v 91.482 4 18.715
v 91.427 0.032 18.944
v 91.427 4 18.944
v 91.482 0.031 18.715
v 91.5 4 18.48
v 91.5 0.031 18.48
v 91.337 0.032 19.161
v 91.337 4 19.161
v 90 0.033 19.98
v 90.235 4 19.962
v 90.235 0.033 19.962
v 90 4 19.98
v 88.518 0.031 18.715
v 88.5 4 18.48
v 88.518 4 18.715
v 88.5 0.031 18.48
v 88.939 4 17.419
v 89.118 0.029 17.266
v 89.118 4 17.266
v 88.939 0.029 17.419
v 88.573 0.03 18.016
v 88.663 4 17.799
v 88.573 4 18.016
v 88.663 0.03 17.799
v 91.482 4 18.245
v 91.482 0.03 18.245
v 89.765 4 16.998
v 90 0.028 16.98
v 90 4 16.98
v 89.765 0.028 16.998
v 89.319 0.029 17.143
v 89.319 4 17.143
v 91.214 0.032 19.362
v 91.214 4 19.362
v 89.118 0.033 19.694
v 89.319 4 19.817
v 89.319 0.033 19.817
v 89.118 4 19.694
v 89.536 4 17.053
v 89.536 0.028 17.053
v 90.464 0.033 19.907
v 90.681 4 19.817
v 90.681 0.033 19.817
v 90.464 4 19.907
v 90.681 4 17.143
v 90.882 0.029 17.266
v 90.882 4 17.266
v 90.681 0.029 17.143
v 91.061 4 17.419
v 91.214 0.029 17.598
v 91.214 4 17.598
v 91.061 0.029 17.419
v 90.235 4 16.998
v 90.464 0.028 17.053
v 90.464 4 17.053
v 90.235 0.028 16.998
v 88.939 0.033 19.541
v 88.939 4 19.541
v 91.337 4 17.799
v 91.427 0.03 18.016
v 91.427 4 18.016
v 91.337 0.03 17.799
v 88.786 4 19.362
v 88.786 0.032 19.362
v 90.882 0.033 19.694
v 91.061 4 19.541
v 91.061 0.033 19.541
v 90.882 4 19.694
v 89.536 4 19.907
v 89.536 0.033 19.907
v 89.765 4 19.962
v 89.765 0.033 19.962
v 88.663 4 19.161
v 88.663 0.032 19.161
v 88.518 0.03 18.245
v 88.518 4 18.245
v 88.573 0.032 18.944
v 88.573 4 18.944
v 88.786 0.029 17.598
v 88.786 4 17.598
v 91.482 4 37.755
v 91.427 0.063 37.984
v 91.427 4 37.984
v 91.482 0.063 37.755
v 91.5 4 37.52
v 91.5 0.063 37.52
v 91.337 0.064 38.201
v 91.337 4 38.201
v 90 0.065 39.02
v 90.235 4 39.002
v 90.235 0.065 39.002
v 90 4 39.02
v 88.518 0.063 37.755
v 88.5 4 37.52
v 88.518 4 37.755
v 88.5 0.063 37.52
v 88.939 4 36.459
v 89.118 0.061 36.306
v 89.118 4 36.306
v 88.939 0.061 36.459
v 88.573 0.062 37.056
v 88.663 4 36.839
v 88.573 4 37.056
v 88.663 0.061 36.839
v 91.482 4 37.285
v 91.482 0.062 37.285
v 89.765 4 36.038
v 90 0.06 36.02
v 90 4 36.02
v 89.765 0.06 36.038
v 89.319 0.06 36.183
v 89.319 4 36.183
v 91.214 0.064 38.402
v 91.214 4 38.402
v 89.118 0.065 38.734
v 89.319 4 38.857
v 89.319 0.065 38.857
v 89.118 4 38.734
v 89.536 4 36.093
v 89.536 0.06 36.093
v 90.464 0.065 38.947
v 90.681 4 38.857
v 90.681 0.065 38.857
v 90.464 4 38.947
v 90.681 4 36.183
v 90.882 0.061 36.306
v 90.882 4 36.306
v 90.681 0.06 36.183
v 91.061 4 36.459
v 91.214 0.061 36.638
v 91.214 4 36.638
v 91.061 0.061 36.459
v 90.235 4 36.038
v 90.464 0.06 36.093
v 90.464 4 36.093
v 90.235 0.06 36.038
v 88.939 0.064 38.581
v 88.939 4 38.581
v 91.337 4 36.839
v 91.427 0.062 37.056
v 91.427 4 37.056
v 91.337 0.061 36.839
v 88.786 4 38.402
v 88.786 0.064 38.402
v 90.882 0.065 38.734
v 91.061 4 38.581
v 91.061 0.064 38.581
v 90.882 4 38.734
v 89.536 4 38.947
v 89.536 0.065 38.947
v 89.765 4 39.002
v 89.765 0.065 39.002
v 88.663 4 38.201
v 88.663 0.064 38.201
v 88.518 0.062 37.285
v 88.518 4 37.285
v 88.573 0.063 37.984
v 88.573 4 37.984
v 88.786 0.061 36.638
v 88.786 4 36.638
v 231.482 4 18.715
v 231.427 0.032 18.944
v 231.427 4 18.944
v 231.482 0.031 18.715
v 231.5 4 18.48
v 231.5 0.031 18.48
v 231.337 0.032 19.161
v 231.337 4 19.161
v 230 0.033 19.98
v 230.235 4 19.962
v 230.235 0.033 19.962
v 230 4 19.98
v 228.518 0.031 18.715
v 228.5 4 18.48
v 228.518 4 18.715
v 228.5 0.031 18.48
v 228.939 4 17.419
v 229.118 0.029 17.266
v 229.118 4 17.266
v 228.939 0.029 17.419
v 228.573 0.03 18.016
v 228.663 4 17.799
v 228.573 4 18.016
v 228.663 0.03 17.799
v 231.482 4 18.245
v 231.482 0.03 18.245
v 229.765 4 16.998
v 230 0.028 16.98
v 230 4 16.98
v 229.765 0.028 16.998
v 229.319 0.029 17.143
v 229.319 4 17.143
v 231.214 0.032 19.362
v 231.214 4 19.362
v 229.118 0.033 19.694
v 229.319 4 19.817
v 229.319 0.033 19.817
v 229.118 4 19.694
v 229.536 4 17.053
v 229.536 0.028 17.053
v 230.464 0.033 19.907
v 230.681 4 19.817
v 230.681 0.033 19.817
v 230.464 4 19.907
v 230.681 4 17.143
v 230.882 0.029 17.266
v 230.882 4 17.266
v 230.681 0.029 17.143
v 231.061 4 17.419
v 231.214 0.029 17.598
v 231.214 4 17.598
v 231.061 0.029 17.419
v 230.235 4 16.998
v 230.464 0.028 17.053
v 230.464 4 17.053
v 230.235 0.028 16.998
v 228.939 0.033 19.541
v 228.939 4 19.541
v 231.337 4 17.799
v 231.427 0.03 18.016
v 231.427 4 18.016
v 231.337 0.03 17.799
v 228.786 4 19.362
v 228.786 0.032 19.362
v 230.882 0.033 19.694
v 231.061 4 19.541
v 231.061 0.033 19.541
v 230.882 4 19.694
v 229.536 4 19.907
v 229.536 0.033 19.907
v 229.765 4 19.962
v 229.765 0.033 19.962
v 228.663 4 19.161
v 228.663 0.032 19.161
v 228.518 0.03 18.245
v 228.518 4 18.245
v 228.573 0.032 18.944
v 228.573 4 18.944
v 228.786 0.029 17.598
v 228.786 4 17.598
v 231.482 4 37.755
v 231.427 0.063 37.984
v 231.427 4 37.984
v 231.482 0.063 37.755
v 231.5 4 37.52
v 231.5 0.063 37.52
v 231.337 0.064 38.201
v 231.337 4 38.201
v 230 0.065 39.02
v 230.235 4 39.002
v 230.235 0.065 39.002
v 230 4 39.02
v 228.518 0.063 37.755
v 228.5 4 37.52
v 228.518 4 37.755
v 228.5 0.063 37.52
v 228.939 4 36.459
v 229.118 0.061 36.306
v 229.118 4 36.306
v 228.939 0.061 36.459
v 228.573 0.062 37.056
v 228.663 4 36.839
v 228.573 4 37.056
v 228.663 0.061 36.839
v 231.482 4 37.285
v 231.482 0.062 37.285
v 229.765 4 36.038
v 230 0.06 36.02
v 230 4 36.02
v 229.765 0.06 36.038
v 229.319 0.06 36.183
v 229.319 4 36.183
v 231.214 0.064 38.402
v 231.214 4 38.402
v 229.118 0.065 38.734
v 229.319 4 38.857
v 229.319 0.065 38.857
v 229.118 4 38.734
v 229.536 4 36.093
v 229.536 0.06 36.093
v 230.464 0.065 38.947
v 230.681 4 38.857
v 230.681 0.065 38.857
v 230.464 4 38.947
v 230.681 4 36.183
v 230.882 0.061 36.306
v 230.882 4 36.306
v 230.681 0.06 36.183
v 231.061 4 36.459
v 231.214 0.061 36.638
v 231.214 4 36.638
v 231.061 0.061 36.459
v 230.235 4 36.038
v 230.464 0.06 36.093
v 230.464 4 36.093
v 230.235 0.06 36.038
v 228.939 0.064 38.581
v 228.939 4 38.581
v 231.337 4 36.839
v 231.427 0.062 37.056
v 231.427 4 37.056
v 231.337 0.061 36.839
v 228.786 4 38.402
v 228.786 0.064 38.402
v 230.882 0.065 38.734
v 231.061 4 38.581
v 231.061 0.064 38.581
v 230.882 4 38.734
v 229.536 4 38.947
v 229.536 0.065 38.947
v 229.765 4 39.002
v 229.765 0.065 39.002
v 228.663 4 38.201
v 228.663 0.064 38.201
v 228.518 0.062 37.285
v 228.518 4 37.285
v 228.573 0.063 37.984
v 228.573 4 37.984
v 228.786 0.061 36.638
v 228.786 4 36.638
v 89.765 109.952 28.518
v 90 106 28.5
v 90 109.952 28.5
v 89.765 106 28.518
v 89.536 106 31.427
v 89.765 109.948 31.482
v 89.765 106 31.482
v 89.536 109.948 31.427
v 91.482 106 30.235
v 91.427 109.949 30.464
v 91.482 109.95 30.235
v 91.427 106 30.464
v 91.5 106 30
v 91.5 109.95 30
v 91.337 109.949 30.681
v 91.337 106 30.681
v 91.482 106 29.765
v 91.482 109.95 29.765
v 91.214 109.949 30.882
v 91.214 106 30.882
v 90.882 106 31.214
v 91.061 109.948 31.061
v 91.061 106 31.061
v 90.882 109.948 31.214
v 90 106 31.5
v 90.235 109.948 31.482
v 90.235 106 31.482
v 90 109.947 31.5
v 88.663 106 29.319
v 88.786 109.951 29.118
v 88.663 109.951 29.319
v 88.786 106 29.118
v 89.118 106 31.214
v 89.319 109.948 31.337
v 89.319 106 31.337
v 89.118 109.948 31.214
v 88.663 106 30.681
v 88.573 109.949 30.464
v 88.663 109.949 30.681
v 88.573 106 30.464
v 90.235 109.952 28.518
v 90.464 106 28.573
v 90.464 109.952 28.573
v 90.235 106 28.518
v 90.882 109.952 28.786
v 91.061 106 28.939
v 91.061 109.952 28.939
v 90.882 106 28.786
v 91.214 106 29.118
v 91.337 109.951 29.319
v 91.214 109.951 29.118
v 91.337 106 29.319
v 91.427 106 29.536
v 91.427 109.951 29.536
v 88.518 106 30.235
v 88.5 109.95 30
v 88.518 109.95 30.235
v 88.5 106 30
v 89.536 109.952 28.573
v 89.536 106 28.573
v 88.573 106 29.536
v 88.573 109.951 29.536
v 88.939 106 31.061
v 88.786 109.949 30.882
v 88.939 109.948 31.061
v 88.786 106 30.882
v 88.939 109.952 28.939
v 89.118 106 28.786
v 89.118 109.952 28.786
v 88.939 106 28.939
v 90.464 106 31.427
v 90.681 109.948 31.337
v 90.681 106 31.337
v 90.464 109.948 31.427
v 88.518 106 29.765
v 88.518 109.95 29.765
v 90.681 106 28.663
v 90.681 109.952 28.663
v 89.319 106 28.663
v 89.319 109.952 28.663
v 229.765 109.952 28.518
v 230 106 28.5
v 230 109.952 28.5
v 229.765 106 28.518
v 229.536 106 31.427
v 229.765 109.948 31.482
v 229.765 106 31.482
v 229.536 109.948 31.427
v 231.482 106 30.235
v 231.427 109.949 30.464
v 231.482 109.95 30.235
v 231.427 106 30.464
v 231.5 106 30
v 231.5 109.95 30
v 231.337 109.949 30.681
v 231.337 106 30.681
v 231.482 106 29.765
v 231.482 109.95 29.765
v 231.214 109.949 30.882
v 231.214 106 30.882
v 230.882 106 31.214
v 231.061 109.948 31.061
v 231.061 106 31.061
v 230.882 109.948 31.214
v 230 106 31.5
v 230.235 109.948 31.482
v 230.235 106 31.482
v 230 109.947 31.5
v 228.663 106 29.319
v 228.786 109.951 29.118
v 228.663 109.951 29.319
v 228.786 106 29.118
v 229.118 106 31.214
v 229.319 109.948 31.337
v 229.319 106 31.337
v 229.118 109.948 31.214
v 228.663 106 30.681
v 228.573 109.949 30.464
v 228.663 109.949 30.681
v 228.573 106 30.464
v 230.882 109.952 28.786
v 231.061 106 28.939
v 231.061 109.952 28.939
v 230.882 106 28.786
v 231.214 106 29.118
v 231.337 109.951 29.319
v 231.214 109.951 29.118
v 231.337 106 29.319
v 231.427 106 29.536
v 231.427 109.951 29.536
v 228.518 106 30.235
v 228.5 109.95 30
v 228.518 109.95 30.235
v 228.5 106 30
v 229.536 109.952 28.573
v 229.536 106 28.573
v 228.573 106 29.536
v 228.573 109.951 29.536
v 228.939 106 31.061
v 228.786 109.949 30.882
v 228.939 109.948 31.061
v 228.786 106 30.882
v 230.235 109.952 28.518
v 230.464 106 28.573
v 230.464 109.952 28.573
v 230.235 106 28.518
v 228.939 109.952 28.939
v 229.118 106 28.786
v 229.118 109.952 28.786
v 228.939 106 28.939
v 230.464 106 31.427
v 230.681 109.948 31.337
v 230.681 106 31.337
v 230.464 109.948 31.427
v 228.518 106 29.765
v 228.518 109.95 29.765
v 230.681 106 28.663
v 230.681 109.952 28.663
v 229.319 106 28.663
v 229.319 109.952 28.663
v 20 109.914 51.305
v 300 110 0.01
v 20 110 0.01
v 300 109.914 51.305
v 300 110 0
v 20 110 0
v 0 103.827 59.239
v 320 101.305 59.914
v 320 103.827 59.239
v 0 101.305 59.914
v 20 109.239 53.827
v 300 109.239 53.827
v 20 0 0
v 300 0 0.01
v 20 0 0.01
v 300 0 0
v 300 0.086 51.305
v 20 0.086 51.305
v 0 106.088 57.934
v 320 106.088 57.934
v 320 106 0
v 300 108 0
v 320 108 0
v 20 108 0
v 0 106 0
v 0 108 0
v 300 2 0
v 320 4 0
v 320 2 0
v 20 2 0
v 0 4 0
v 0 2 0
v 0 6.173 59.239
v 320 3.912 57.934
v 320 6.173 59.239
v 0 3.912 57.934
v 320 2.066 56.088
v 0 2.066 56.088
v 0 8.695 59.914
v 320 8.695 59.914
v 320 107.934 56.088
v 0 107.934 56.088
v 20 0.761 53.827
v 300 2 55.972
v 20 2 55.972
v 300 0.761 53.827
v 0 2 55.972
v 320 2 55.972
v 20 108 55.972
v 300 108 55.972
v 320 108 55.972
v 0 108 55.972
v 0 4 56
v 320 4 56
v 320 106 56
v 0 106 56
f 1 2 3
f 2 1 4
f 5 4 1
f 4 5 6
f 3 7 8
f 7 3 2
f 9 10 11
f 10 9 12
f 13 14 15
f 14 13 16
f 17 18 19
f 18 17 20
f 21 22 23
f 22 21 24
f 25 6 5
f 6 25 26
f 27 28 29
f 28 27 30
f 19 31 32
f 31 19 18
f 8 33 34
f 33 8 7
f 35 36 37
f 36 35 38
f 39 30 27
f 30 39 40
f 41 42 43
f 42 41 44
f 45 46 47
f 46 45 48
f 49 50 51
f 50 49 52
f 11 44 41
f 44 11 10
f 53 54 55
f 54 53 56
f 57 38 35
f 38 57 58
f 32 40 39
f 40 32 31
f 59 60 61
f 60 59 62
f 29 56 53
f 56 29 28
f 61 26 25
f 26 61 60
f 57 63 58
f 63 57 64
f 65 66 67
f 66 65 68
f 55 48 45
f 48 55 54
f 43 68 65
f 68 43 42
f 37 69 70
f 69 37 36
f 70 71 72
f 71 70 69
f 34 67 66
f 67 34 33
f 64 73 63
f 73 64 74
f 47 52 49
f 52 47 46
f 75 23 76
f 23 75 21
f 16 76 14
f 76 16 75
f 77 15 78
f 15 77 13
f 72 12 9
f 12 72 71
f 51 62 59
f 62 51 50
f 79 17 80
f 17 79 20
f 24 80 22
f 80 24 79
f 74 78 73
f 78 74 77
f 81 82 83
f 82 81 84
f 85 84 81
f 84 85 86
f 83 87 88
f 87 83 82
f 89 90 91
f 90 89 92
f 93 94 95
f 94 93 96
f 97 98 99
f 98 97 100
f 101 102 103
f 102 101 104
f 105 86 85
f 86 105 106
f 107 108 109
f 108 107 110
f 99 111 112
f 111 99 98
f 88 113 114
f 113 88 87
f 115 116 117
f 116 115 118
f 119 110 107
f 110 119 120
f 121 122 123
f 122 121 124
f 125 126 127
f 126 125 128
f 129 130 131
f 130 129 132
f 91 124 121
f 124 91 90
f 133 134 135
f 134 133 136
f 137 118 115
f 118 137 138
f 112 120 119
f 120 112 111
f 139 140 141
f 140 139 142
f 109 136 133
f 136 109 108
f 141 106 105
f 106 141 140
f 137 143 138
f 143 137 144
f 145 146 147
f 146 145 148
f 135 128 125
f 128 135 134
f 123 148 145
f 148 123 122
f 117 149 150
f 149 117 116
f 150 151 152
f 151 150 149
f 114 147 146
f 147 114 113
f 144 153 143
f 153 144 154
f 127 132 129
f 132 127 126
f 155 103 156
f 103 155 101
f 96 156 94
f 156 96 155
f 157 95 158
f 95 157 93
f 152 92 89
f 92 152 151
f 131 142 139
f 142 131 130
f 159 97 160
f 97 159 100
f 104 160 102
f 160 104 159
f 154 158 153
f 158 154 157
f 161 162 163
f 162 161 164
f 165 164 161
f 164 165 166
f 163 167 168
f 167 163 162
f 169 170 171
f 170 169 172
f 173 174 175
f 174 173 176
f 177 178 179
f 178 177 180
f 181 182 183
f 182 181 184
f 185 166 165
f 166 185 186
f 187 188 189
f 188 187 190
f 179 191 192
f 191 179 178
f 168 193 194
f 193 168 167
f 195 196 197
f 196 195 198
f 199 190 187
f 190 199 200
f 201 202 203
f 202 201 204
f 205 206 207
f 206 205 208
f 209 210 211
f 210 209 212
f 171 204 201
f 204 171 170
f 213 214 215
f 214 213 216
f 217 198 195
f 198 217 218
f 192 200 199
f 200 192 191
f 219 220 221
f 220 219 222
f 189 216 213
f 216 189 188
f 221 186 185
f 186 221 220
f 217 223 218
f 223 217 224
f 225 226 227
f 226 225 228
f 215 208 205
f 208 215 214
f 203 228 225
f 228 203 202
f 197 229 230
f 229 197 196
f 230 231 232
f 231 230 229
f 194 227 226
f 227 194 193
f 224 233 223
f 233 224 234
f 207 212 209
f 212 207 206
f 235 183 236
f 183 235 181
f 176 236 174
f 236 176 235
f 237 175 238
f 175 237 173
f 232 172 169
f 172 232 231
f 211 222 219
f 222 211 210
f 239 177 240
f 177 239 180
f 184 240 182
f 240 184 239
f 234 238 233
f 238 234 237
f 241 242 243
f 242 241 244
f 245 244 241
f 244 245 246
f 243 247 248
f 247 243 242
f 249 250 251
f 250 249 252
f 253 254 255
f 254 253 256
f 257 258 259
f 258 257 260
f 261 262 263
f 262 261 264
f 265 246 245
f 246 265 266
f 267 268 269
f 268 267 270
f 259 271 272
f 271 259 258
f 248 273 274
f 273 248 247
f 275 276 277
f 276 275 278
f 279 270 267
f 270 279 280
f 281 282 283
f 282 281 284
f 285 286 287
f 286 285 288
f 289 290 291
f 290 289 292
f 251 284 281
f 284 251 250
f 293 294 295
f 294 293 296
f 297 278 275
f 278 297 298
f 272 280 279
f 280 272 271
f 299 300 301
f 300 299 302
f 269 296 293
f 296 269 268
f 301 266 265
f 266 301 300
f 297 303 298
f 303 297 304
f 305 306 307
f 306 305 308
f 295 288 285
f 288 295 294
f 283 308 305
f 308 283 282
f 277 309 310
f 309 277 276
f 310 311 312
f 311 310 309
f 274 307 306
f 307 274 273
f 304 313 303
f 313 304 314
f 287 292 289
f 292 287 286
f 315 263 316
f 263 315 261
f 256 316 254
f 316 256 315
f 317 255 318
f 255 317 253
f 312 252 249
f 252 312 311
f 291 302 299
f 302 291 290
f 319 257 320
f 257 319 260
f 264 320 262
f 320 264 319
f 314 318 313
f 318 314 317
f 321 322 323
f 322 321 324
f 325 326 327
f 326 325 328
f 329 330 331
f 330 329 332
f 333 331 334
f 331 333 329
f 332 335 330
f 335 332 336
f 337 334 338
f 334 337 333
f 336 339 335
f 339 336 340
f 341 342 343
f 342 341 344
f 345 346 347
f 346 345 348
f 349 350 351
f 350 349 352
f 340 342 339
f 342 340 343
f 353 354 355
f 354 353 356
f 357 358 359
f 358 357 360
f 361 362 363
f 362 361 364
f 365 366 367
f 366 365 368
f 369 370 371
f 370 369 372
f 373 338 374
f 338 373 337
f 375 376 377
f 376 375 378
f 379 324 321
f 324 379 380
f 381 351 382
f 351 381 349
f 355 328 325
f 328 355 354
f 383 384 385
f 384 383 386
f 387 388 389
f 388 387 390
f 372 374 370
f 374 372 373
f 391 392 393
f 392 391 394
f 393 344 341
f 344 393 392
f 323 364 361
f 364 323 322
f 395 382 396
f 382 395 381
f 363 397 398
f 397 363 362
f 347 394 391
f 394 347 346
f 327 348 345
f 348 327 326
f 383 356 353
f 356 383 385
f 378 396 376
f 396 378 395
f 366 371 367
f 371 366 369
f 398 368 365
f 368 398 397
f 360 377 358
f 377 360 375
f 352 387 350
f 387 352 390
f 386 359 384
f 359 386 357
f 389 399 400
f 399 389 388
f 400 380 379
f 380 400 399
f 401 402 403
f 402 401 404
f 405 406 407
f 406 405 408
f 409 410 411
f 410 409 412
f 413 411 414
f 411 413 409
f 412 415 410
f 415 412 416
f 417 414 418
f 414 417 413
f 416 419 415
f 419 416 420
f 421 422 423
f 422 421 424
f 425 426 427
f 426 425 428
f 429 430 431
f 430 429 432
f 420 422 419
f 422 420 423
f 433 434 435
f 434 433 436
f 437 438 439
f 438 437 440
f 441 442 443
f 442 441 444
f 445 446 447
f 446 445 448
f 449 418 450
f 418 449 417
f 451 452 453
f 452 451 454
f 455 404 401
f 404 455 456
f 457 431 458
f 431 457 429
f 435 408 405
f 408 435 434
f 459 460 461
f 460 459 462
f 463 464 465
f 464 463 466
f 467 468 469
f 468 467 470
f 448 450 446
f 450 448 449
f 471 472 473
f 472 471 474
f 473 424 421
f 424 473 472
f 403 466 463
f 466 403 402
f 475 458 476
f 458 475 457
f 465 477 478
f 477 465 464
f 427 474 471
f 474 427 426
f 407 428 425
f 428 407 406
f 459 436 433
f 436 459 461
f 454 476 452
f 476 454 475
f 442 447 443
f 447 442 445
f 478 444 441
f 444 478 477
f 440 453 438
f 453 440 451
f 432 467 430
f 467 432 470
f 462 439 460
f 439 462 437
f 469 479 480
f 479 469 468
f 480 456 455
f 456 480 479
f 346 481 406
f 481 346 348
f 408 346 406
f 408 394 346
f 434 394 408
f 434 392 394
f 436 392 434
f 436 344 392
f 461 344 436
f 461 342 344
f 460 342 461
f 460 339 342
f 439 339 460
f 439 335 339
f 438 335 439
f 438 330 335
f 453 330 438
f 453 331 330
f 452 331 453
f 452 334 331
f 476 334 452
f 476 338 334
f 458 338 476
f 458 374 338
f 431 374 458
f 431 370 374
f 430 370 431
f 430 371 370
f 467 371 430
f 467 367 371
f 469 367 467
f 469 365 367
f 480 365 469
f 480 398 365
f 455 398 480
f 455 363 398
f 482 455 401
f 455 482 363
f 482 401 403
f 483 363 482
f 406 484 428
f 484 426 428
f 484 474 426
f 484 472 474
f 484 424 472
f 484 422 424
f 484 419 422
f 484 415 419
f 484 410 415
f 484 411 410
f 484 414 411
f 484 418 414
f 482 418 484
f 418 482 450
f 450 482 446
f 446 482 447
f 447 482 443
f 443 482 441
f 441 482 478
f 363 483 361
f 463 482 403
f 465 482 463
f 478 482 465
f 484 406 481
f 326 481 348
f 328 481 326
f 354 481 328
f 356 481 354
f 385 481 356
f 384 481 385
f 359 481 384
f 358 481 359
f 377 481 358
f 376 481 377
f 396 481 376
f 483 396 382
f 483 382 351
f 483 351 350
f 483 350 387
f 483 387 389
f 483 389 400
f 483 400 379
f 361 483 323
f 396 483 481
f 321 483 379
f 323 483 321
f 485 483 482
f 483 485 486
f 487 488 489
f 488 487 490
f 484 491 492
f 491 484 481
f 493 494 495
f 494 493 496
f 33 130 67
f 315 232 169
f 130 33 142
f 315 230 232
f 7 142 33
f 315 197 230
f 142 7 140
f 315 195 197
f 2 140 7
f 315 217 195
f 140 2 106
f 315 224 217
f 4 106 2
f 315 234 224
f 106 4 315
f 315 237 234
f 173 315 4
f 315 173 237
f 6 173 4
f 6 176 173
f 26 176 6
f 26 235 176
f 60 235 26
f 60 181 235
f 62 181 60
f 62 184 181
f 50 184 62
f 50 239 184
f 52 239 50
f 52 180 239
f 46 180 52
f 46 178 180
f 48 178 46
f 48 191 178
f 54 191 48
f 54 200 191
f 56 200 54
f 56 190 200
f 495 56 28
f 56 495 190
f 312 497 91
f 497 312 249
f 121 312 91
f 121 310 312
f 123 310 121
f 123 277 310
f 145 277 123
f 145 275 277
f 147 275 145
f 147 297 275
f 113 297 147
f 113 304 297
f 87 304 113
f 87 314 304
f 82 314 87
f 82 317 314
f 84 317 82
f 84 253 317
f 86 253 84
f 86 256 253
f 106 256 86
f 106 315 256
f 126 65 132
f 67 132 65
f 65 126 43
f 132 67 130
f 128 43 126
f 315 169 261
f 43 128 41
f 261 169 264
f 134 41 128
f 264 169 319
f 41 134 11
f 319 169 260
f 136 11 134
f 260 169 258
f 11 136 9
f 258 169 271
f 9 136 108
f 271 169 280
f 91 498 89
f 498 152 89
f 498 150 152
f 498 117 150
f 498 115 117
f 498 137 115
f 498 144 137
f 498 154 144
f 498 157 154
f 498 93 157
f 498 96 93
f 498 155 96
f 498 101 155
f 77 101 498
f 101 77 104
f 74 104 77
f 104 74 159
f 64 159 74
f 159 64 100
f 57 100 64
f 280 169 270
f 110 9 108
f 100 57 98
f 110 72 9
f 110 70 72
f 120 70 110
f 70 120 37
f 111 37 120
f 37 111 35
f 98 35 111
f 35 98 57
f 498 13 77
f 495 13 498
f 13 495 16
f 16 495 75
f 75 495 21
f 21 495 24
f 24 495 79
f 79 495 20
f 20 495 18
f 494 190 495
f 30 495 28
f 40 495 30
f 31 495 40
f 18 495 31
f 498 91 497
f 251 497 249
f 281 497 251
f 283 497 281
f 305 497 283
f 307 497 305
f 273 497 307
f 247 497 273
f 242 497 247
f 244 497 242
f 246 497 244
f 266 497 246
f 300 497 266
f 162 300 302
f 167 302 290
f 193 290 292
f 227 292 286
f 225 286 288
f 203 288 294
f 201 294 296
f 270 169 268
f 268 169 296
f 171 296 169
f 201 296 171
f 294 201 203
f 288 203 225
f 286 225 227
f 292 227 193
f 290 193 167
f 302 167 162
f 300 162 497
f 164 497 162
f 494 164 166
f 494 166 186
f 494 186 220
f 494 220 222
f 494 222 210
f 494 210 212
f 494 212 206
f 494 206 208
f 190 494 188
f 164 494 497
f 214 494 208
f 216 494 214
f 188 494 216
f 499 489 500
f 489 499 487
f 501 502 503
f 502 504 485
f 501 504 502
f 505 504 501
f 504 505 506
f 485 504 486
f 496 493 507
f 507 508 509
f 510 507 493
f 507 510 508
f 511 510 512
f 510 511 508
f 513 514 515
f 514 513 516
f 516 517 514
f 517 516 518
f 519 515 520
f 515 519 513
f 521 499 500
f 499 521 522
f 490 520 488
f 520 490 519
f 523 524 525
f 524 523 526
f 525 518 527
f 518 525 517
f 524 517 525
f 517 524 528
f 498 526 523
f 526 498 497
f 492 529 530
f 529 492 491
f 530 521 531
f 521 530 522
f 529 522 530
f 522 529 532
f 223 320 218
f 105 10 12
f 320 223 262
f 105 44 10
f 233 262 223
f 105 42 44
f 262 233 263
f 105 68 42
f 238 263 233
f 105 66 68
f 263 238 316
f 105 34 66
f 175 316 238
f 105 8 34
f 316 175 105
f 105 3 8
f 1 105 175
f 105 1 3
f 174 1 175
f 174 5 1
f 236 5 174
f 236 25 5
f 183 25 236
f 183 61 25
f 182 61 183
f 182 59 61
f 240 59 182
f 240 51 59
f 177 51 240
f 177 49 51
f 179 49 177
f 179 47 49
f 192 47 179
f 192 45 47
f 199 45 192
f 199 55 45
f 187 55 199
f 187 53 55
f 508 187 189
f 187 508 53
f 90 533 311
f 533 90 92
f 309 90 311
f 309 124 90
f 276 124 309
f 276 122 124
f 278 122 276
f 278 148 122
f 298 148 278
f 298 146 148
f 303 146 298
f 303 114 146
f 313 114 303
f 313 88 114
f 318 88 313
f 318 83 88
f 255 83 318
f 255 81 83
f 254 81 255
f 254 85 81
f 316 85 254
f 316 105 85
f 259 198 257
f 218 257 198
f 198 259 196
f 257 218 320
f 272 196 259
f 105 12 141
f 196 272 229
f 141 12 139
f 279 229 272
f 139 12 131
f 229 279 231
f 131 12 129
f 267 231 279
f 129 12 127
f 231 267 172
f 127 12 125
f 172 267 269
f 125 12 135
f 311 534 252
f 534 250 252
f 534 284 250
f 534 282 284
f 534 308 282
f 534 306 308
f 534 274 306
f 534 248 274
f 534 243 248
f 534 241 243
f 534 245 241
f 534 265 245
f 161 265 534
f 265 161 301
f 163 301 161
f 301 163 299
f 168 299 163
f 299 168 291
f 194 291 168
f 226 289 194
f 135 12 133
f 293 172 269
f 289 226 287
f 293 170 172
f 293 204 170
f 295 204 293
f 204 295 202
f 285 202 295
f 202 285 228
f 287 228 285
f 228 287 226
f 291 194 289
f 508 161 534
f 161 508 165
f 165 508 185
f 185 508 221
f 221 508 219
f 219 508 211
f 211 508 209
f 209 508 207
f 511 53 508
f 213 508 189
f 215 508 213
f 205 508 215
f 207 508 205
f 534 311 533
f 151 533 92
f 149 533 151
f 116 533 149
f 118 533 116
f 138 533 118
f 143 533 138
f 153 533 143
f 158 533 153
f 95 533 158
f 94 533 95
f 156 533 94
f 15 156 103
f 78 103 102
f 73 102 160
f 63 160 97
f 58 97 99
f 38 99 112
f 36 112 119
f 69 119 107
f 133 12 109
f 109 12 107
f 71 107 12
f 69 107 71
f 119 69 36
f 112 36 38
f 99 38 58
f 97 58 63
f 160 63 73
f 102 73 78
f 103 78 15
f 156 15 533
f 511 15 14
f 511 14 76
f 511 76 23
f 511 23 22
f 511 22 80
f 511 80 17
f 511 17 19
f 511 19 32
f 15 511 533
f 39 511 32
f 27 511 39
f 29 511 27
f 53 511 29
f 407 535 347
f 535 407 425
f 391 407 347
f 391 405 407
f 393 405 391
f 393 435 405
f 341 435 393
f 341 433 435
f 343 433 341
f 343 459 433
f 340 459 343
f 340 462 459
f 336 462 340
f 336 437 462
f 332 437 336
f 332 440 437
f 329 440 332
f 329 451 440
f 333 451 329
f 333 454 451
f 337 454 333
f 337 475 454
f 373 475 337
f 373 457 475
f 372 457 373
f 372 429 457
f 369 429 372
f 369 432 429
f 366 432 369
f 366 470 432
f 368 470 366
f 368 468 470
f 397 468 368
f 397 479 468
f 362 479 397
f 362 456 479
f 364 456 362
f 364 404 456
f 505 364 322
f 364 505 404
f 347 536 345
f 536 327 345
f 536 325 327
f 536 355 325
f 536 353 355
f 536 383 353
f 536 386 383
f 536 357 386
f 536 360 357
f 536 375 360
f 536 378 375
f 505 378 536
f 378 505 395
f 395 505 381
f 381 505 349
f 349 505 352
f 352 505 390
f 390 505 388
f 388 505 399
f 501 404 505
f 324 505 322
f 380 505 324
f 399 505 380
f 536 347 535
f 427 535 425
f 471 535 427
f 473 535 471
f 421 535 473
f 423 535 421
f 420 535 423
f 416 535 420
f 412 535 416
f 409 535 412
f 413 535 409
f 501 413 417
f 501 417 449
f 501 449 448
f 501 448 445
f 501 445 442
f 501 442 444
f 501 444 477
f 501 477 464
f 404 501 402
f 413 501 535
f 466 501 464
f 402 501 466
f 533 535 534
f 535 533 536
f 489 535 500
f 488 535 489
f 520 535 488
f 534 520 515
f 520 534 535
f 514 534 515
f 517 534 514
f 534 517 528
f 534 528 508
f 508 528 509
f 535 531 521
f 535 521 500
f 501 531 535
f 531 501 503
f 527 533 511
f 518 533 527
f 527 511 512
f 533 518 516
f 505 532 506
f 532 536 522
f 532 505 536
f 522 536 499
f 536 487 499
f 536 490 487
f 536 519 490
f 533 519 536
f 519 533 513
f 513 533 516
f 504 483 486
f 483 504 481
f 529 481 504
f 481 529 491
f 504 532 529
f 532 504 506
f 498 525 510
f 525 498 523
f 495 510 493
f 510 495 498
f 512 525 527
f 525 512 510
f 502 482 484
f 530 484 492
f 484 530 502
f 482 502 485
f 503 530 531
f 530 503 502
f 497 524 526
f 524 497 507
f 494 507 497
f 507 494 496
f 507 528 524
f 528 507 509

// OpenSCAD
include <protective_storage_box.scad>
lid_angle = 0;
show_tray_in_assembly = false;
render_assembly = false;
rotate([180, 0, 0]) translate([-mid_start, -width, -lid_h]) box_lid_middle();
